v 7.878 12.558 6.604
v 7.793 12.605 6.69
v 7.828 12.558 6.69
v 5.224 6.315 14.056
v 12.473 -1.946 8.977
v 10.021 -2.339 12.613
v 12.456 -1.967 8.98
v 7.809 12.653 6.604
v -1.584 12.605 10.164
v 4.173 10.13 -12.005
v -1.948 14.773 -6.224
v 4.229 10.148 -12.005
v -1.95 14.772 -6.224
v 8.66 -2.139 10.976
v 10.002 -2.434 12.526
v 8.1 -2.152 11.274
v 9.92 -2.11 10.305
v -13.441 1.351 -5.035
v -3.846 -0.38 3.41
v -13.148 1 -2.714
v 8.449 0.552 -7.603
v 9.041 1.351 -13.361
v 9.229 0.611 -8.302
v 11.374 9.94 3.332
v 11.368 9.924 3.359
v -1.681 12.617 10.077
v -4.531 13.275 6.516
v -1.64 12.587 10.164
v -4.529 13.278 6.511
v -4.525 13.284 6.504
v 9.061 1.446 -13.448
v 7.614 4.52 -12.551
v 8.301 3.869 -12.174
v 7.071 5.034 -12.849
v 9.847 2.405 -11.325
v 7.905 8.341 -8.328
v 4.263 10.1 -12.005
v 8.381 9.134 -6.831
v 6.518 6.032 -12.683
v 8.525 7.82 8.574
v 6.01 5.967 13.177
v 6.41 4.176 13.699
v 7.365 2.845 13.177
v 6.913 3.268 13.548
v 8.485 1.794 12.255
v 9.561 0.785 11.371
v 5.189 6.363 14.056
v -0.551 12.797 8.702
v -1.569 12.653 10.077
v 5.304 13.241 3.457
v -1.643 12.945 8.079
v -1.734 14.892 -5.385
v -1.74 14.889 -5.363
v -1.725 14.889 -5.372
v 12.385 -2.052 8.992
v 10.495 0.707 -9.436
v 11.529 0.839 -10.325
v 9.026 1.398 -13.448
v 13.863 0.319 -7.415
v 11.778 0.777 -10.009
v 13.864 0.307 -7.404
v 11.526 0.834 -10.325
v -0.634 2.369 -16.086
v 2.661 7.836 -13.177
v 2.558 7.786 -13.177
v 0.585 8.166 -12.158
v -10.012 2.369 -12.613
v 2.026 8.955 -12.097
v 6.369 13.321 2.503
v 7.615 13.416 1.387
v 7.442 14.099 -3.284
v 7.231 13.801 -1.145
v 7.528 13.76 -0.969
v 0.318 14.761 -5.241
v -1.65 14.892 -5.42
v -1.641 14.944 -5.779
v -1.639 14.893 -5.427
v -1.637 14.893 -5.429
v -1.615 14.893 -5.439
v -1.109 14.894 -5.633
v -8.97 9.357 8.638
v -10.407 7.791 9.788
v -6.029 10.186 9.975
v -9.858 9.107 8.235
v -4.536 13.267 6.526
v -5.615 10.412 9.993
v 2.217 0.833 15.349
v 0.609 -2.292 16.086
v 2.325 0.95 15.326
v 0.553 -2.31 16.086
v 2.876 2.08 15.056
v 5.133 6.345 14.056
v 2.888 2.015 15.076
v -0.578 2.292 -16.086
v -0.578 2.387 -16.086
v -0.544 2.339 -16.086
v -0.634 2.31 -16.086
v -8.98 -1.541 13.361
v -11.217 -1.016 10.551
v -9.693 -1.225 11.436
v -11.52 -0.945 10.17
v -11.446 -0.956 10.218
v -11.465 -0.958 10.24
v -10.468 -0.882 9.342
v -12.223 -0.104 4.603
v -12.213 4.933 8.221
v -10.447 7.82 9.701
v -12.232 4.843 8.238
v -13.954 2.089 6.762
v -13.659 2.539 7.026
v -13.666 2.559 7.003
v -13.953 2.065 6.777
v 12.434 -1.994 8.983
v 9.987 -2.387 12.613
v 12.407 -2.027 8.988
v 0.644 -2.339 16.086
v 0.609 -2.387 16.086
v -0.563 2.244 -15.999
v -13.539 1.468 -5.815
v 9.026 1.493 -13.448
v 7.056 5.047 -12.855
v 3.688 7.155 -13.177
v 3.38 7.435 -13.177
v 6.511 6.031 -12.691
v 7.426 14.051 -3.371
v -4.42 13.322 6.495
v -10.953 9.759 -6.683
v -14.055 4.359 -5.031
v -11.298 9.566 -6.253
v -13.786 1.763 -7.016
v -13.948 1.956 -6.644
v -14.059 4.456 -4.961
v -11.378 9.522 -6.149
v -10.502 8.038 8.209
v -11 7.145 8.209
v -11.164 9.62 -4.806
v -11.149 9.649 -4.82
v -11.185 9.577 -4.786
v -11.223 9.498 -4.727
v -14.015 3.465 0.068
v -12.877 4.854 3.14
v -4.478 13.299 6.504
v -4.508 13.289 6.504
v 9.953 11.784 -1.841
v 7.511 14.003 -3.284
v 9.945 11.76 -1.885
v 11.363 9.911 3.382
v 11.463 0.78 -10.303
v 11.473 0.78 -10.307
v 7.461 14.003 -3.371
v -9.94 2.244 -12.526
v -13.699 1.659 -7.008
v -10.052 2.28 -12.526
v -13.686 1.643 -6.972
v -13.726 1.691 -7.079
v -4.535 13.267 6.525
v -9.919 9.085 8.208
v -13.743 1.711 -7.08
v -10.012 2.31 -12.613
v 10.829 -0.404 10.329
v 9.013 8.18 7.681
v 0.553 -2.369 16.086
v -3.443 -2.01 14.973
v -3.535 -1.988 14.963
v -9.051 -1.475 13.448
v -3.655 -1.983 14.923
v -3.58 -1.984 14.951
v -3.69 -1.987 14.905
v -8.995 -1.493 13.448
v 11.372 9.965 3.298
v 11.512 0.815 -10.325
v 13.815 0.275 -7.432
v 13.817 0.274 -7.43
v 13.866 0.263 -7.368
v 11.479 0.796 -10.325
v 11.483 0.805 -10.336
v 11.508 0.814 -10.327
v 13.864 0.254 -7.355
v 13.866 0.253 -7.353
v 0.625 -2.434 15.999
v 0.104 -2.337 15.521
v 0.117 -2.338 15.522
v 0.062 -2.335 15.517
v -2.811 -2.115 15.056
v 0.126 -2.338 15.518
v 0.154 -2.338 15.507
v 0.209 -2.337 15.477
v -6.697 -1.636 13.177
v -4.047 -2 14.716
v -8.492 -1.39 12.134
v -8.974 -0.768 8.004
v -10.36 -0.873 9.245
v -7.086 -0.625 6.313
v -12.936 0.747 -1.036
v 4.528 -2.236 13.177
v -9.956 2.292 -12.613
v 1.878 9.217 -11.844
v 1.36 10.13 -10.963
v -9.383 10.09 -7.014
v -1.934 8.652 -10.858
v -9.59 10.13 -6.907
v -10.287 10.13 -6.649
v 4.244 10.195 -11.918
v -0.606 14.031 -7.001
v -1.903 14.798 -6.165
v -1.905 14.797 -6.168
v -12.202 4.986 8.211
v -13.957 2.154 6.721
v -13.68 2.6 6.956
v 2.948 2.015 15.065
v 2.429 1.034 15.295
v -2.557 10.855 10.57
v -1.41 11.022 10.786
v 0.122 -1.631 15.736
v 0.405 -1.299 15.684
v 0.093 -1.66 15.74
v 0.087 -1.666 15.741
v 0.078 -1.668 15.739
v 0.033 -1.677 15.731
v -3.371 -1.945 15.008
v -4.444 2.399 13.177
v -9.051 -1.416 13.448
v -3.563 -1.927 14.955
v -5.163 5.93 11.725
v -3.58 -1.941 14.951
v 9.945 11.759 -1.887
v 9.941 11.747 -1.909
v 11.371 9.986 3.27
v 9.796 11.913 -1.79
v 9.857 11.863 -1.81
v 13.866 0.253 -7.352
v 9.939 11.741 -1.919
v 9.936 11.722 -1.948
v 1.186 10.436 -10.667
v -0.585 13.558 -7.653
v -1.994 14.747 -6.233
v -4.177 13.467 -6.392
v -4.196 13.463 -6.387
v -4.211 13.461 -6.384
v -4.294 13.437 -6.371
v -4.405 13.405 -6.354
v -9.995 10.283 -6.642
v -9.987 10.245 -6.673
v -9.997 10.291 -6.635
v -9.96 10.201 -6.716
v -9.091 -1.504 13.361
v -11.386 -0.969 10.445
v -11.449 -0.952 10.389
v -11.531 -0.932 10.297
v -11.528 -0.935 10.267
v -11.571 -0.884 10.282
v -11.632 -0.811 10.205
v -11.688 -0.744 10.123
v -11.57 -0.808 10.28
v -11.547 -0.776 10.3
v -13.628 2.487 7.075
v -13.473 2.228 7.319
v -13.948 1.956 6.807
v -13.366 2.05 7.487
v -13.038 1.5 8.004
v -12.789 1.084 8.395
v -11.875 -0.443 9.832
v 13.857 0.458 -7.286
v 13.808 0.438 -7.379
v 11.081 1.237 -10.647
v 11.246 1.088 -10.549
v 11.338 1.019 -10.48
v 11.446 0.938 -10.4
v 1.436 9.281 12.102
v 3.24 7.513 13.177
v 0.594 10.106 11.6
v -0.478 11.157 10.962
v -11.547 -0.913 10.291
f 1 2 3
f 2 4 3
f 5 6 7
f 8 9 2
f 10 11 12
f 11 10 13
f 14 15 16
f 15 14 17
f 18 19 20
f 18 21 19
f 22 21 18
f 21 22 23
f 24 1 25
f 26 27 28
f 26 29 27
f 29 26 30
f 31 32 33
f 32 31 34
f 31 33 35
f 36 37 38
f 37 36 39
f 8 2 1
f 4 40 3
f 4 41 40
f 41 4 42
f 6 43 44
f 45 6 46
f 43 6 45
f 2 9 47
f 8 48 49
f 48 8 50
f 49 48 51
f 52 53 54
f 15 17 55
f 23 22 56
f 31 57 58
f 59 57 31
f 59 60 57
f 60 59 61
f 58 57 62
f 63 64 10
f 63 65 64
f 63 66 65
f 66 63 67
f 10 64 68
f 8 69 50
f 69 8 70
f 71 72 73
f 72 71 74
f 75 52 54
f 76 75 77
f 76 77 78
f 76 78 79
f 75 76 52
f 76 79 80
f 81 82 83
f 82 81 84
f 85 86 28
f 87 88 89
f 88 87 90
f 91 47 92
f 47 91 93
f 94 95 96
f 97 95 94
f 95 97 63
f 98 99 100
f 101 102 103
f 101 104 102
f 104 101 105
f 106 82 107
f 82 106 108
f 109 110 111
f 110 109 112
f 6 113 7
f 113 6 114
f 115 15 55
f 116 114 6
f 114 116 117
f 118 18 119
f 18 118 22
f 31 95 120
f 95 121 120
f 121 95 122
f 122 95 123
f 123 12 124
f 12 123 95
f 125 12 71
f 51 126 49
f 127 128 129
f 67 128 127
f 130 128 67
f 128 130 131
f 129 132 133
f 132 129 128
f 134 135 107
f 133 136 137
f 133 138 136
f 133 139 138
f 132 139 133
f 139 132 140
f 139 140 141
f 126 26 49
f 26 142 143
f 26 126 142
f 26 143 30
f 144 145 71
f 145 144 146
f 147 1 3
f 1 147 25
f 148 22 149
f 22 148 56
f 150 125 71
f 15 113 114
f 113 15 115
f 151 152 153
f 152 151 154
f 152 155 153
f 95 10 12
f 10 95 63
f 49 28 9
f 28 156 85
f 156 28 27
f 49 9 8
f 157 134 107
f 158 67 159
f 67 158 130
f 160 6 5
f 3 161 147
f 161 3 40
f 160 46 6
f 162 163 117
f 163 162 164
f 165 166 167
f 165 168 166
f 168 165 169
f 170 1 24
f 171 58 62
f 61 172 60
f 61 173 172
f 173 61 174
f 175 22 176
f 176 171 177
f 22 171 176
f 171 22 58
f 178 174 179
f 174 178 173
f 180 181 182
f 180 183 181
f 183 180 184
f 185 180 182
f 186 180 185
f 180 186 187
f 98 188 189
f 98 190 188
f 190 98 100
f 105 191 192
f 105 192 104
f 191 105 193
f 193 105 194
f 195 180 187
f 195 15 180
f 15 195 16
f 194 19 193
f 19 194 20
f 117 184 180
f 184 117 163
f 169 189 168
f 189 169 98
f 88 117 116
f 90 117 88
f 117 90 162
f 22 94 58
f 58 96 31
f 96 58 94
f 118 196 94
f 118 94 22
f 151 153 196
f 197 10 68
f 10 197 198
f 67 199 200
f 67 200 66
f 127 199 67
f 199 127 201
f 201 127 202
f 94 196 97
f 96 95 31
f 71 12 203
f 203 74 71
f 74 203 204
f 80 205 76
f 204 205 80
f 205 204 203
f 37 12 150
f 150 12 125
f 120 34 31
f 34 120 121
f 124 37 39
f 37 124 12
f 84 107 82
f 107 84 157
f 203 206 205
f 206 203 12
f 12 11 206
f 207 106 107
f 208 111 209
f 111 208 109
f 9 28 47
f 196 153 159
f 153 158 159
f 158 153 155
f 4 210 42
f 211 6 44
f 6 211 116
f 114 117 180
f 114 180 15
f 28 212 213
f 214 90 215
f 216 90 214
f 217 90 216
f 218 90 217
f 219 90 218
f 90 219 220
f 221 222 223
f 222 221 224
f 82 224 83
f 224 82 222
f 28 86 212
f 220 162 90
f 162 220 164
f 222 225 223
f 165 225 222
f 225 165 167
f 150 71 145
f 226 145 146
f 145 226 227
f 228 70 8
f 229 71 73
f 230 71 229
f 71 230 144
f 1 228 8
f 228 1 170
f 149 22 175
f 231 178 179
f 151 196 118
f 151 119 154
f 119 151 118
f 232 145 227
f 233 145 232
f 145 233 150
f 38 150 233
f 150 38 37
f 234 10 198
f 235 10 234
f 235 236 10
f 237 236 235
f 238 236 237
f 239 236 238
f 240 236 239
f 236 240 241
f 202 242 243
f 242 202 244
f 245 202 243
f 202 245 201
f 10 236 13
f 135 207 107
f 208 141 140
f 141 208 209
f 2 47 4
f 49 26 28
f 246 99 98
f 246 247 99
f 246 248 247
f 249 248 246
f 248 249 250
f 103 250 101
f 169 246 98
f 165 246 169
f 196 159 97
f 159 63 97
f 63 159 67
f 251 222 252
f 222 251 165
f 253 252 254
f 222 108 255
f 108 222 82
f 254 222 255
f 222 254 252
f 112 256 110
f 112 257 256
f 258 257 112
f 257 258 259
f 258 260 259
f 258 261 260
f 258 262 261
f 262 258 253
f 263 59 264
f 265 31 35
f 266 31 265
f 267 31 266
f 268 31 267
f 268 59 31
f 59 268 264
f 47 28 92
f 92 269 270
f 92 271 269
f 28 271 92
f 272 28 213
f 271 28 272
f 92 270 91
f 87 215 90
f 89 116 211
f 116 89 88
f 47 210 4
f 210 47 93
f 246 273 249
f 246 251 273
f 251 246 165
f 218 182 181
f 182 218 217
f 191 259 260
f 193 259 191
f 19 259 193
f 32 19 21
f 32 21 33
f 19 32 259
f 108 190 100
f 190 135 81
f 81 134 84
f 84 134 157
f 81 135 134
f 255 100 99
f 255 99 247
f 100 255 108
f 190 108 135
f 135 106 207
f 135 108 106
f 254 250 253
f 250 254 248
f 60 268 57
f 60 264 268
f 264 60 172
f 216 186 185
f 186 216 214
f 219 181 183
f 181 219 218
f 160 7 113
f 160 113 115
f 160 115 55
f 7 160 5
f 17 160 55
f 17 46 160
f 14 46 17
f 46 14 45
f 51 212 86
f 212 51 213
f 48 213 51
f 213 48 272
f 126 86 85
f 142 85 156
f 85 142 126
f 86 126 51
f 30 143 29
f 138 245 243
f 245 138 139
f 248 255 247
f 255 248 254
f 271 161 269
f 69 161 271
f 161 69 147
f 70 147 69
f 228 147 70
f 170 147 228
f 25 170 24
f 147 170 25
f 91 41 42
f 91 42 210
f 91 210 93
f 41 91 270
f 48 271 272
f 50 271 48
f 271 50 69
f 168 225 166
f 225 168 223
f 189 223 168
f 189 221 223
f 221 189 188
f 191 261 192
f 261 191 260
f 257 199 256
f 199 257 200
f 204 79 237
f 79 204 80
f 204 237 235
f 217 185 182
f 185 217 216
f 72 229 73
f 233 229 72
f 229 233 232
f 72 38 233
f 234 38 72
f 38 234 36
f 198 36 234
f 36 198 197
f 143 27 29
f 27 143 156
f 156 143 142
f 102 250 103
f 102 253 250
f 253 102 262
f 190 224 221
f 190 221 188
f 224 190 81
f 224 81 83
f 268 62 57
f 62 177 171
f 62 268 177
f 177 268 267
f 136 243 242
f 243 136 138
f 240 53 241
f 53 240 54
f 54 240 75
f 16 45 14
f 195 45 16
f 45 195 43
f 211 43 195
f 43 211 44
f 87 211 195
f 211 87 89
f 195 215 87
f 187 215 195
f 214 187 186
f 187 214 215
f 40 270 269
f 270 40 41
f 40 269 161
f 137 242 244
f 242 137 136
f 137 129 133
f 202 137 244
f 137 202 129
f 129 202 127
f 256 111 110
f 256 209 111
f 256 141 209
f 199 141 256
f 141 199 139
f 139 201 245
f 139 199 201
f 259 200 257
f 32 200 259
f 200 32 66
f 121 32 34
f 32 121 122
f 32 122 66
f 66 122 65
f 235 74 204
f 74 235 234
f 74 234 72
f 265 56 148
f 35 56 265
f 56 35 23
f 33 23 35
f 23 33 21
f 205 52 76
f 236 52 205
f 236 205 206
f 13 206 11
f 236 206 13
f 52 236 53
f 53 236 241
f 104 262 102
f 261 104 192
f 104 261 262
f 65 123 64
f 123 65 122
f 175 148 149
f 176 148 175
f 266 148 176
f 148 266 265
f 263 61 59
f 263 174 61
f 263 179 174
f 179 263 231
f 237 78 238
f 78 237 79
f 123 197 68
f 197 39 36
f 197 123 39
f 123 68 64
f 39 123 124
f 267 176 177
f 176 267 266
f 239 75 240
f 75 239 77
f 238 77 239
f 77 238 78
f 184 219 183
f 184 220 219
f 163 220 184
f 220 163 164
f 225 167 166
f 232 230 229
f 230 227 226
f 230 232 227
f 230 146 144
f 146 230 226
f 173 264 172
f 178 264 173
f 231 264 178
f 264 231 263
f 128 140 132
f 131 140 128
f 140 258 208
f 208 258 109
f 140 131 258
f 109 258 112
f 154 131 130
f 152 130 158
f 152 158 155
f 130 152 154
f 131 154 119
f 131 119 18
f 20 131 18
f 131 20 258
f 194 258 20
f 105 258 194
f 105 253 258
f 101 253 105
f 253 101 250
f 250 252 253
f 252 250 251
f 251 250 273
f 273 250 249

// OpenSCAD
// Auto-generated OpenSCAD file

    inner_points = 10*[[1.4127776500989453, -0.7887289142226223, 3.3946051633490118e-15], [-1.4127776500989453, 0.7887289142226223, -3.3946051633490118e-15], [7.699325831418754e-14, 1.448747966845947e-13, 1.618033988749895], [0.7887289142226223, 1.4127776500989453, -1.6402787932550622e-13], [1.3866917666528789, -0.20152279240725185, 0.8090169943748995], [1.386691766652802, -0.2015227924073968, -0.8090169943749954], [0.899230489753498, -1.0746673987146065, 0.809016994375001], [-0.8992304897534211, 1.0746673987147513, 0.8090169943748939], [-0.899230489753498, 1.0746673987146065, -0.809016994375001], [-1.386691766652802, 0.2015227924073968, 0.8090169943749954], [1.3444839206104982, 0.7485966710918835, 0.499999999999869], [1.3444839206104504, 0.7485966710917942, -0.500000000000131], [-0.06829372948844725, 1.5373255853145058, 0.49999999999986555], [-0.06829372948849499, 1.5373255853144165, -0.5000000000001343], [0.8309367602650506, 0.46265818659989943, 1.3090169943748666], [0.8309367602649261, 0.46265818659966507, -1.3090169943750283], [0.04220784604242839, -0.950119463499046, 1.3090169943750305], [-0.042207846042303876, 0.9501194634992803, 1.3090169943748644], [-0.04220784604242839, 0.950119463499046, -1.3090169943750305], [-0.8309367602649261, -0.46265818659966507, 1.3090169943750283]];

    outer_points = 10*[[1.51730962461505, 0.0, -0.5619657389916497], [-1.51730962461505, 0.0, 0.5619657389916497], [0.5173908766017687, 0.6315464316752465, 1.3969573272642983], [-0.2193448714004602, 1.4896922814420965, -0.592231983898246], [1.4184434174514022, 0.7761134471924181, 0.0608290828944803], [0.9010525408496336, 0.14456701551717166, -1.3361282443698181], [1.5540060032348615, -0.14456701551717166, 0.42684857816837674], [-1.0366151266330927, 0.7761134471924181, 0.9701087490959216], [-1.5540060032348615, 0.14456701551717166, -0.42684857816837674], [-0.9010525408496336, -0.14456701551717166, 1.3361282443698181], [0.7410836573200632, 1.4003449522003508, -0.3284250545406229], [0.4213185101110674, 1.0100277919513354, -1.1917921636231694], [-0.7762259672949867, 1.4003449522003508, 0.2335406844510268], [-1.0959911145039825, 1.0100277919513354, -0.6298264246315197], [0.7777800359398745, 1.2557779366831792, 0.6603892626194036], [-0.05937598787088977, 0.23391434475891726, -1.5999351737274412], [0.9971249073403348, -0.23391434475891726, 1.2526212465176494], [-0.15996888352957034, 1.2557779366831792, 1.0077031898291953], [-0.9971249073403348, 0.23391434475891726, -1.2526212465176494], [0.05937598787088977, -0.23391434475891726, 1.5999351737274412]];

    // Convex hull for inner set (I)
    module inner_hull() {
        hull() {
            for (p = inner_points) {
                translate(p) sphere(r=0.1);
            }
        }
    }

    // Convex hull for outer set (O) minus inner hull (O \ I)
    module outer_minus_inner() {
        difference() {
            hull() {
                for (p = outer_points) {
                    translate(p) sphere(r=0.1);
                }
            }
            inner_hull(); // Subtract inner hull
        }
    }

    // Convex hull for outer set (O) minus all translated inner hulls
    module outer_minus_AllTranslationInner() {
        difference() {
            hull() {
                for (p = outer_points) {
                    translate(p) sphere(r=0.1);
                }
            }
            hull() {
                translate([0,0,50]) inner_hull();
                translate([0,0,-50]) inner_hull();
            }; // Subtract translated inner hulls
        }
    }

    // Difference between outer_minus_inner and outer_minus_AllTranslationInner
    module outer_minus_inner_diff() {
        difference() {
            // Outer minus inner
            difference() {
                hull() {
                    for (p = outer_points) {
                        translate(p) sphere(r=0.1);
                    }
                }
                inner_hull();
            }

            // Subtract Outer minus AllTranslationInner
            difference() {
                hull() {
                    for (p = outer_points) {
                        translate(p) sphere(r=0.1);
                    }
                }
                hull() {
                    translate([0,0,50]) inner_hull();
                    translate([0,0,-50]) inner_hull();
                };
            }
        }
    }

    // Rendering all with colors applied
    color([1, 1, 0, 1]) outer_minus_inner_diff(); // Opaque yellow
    
